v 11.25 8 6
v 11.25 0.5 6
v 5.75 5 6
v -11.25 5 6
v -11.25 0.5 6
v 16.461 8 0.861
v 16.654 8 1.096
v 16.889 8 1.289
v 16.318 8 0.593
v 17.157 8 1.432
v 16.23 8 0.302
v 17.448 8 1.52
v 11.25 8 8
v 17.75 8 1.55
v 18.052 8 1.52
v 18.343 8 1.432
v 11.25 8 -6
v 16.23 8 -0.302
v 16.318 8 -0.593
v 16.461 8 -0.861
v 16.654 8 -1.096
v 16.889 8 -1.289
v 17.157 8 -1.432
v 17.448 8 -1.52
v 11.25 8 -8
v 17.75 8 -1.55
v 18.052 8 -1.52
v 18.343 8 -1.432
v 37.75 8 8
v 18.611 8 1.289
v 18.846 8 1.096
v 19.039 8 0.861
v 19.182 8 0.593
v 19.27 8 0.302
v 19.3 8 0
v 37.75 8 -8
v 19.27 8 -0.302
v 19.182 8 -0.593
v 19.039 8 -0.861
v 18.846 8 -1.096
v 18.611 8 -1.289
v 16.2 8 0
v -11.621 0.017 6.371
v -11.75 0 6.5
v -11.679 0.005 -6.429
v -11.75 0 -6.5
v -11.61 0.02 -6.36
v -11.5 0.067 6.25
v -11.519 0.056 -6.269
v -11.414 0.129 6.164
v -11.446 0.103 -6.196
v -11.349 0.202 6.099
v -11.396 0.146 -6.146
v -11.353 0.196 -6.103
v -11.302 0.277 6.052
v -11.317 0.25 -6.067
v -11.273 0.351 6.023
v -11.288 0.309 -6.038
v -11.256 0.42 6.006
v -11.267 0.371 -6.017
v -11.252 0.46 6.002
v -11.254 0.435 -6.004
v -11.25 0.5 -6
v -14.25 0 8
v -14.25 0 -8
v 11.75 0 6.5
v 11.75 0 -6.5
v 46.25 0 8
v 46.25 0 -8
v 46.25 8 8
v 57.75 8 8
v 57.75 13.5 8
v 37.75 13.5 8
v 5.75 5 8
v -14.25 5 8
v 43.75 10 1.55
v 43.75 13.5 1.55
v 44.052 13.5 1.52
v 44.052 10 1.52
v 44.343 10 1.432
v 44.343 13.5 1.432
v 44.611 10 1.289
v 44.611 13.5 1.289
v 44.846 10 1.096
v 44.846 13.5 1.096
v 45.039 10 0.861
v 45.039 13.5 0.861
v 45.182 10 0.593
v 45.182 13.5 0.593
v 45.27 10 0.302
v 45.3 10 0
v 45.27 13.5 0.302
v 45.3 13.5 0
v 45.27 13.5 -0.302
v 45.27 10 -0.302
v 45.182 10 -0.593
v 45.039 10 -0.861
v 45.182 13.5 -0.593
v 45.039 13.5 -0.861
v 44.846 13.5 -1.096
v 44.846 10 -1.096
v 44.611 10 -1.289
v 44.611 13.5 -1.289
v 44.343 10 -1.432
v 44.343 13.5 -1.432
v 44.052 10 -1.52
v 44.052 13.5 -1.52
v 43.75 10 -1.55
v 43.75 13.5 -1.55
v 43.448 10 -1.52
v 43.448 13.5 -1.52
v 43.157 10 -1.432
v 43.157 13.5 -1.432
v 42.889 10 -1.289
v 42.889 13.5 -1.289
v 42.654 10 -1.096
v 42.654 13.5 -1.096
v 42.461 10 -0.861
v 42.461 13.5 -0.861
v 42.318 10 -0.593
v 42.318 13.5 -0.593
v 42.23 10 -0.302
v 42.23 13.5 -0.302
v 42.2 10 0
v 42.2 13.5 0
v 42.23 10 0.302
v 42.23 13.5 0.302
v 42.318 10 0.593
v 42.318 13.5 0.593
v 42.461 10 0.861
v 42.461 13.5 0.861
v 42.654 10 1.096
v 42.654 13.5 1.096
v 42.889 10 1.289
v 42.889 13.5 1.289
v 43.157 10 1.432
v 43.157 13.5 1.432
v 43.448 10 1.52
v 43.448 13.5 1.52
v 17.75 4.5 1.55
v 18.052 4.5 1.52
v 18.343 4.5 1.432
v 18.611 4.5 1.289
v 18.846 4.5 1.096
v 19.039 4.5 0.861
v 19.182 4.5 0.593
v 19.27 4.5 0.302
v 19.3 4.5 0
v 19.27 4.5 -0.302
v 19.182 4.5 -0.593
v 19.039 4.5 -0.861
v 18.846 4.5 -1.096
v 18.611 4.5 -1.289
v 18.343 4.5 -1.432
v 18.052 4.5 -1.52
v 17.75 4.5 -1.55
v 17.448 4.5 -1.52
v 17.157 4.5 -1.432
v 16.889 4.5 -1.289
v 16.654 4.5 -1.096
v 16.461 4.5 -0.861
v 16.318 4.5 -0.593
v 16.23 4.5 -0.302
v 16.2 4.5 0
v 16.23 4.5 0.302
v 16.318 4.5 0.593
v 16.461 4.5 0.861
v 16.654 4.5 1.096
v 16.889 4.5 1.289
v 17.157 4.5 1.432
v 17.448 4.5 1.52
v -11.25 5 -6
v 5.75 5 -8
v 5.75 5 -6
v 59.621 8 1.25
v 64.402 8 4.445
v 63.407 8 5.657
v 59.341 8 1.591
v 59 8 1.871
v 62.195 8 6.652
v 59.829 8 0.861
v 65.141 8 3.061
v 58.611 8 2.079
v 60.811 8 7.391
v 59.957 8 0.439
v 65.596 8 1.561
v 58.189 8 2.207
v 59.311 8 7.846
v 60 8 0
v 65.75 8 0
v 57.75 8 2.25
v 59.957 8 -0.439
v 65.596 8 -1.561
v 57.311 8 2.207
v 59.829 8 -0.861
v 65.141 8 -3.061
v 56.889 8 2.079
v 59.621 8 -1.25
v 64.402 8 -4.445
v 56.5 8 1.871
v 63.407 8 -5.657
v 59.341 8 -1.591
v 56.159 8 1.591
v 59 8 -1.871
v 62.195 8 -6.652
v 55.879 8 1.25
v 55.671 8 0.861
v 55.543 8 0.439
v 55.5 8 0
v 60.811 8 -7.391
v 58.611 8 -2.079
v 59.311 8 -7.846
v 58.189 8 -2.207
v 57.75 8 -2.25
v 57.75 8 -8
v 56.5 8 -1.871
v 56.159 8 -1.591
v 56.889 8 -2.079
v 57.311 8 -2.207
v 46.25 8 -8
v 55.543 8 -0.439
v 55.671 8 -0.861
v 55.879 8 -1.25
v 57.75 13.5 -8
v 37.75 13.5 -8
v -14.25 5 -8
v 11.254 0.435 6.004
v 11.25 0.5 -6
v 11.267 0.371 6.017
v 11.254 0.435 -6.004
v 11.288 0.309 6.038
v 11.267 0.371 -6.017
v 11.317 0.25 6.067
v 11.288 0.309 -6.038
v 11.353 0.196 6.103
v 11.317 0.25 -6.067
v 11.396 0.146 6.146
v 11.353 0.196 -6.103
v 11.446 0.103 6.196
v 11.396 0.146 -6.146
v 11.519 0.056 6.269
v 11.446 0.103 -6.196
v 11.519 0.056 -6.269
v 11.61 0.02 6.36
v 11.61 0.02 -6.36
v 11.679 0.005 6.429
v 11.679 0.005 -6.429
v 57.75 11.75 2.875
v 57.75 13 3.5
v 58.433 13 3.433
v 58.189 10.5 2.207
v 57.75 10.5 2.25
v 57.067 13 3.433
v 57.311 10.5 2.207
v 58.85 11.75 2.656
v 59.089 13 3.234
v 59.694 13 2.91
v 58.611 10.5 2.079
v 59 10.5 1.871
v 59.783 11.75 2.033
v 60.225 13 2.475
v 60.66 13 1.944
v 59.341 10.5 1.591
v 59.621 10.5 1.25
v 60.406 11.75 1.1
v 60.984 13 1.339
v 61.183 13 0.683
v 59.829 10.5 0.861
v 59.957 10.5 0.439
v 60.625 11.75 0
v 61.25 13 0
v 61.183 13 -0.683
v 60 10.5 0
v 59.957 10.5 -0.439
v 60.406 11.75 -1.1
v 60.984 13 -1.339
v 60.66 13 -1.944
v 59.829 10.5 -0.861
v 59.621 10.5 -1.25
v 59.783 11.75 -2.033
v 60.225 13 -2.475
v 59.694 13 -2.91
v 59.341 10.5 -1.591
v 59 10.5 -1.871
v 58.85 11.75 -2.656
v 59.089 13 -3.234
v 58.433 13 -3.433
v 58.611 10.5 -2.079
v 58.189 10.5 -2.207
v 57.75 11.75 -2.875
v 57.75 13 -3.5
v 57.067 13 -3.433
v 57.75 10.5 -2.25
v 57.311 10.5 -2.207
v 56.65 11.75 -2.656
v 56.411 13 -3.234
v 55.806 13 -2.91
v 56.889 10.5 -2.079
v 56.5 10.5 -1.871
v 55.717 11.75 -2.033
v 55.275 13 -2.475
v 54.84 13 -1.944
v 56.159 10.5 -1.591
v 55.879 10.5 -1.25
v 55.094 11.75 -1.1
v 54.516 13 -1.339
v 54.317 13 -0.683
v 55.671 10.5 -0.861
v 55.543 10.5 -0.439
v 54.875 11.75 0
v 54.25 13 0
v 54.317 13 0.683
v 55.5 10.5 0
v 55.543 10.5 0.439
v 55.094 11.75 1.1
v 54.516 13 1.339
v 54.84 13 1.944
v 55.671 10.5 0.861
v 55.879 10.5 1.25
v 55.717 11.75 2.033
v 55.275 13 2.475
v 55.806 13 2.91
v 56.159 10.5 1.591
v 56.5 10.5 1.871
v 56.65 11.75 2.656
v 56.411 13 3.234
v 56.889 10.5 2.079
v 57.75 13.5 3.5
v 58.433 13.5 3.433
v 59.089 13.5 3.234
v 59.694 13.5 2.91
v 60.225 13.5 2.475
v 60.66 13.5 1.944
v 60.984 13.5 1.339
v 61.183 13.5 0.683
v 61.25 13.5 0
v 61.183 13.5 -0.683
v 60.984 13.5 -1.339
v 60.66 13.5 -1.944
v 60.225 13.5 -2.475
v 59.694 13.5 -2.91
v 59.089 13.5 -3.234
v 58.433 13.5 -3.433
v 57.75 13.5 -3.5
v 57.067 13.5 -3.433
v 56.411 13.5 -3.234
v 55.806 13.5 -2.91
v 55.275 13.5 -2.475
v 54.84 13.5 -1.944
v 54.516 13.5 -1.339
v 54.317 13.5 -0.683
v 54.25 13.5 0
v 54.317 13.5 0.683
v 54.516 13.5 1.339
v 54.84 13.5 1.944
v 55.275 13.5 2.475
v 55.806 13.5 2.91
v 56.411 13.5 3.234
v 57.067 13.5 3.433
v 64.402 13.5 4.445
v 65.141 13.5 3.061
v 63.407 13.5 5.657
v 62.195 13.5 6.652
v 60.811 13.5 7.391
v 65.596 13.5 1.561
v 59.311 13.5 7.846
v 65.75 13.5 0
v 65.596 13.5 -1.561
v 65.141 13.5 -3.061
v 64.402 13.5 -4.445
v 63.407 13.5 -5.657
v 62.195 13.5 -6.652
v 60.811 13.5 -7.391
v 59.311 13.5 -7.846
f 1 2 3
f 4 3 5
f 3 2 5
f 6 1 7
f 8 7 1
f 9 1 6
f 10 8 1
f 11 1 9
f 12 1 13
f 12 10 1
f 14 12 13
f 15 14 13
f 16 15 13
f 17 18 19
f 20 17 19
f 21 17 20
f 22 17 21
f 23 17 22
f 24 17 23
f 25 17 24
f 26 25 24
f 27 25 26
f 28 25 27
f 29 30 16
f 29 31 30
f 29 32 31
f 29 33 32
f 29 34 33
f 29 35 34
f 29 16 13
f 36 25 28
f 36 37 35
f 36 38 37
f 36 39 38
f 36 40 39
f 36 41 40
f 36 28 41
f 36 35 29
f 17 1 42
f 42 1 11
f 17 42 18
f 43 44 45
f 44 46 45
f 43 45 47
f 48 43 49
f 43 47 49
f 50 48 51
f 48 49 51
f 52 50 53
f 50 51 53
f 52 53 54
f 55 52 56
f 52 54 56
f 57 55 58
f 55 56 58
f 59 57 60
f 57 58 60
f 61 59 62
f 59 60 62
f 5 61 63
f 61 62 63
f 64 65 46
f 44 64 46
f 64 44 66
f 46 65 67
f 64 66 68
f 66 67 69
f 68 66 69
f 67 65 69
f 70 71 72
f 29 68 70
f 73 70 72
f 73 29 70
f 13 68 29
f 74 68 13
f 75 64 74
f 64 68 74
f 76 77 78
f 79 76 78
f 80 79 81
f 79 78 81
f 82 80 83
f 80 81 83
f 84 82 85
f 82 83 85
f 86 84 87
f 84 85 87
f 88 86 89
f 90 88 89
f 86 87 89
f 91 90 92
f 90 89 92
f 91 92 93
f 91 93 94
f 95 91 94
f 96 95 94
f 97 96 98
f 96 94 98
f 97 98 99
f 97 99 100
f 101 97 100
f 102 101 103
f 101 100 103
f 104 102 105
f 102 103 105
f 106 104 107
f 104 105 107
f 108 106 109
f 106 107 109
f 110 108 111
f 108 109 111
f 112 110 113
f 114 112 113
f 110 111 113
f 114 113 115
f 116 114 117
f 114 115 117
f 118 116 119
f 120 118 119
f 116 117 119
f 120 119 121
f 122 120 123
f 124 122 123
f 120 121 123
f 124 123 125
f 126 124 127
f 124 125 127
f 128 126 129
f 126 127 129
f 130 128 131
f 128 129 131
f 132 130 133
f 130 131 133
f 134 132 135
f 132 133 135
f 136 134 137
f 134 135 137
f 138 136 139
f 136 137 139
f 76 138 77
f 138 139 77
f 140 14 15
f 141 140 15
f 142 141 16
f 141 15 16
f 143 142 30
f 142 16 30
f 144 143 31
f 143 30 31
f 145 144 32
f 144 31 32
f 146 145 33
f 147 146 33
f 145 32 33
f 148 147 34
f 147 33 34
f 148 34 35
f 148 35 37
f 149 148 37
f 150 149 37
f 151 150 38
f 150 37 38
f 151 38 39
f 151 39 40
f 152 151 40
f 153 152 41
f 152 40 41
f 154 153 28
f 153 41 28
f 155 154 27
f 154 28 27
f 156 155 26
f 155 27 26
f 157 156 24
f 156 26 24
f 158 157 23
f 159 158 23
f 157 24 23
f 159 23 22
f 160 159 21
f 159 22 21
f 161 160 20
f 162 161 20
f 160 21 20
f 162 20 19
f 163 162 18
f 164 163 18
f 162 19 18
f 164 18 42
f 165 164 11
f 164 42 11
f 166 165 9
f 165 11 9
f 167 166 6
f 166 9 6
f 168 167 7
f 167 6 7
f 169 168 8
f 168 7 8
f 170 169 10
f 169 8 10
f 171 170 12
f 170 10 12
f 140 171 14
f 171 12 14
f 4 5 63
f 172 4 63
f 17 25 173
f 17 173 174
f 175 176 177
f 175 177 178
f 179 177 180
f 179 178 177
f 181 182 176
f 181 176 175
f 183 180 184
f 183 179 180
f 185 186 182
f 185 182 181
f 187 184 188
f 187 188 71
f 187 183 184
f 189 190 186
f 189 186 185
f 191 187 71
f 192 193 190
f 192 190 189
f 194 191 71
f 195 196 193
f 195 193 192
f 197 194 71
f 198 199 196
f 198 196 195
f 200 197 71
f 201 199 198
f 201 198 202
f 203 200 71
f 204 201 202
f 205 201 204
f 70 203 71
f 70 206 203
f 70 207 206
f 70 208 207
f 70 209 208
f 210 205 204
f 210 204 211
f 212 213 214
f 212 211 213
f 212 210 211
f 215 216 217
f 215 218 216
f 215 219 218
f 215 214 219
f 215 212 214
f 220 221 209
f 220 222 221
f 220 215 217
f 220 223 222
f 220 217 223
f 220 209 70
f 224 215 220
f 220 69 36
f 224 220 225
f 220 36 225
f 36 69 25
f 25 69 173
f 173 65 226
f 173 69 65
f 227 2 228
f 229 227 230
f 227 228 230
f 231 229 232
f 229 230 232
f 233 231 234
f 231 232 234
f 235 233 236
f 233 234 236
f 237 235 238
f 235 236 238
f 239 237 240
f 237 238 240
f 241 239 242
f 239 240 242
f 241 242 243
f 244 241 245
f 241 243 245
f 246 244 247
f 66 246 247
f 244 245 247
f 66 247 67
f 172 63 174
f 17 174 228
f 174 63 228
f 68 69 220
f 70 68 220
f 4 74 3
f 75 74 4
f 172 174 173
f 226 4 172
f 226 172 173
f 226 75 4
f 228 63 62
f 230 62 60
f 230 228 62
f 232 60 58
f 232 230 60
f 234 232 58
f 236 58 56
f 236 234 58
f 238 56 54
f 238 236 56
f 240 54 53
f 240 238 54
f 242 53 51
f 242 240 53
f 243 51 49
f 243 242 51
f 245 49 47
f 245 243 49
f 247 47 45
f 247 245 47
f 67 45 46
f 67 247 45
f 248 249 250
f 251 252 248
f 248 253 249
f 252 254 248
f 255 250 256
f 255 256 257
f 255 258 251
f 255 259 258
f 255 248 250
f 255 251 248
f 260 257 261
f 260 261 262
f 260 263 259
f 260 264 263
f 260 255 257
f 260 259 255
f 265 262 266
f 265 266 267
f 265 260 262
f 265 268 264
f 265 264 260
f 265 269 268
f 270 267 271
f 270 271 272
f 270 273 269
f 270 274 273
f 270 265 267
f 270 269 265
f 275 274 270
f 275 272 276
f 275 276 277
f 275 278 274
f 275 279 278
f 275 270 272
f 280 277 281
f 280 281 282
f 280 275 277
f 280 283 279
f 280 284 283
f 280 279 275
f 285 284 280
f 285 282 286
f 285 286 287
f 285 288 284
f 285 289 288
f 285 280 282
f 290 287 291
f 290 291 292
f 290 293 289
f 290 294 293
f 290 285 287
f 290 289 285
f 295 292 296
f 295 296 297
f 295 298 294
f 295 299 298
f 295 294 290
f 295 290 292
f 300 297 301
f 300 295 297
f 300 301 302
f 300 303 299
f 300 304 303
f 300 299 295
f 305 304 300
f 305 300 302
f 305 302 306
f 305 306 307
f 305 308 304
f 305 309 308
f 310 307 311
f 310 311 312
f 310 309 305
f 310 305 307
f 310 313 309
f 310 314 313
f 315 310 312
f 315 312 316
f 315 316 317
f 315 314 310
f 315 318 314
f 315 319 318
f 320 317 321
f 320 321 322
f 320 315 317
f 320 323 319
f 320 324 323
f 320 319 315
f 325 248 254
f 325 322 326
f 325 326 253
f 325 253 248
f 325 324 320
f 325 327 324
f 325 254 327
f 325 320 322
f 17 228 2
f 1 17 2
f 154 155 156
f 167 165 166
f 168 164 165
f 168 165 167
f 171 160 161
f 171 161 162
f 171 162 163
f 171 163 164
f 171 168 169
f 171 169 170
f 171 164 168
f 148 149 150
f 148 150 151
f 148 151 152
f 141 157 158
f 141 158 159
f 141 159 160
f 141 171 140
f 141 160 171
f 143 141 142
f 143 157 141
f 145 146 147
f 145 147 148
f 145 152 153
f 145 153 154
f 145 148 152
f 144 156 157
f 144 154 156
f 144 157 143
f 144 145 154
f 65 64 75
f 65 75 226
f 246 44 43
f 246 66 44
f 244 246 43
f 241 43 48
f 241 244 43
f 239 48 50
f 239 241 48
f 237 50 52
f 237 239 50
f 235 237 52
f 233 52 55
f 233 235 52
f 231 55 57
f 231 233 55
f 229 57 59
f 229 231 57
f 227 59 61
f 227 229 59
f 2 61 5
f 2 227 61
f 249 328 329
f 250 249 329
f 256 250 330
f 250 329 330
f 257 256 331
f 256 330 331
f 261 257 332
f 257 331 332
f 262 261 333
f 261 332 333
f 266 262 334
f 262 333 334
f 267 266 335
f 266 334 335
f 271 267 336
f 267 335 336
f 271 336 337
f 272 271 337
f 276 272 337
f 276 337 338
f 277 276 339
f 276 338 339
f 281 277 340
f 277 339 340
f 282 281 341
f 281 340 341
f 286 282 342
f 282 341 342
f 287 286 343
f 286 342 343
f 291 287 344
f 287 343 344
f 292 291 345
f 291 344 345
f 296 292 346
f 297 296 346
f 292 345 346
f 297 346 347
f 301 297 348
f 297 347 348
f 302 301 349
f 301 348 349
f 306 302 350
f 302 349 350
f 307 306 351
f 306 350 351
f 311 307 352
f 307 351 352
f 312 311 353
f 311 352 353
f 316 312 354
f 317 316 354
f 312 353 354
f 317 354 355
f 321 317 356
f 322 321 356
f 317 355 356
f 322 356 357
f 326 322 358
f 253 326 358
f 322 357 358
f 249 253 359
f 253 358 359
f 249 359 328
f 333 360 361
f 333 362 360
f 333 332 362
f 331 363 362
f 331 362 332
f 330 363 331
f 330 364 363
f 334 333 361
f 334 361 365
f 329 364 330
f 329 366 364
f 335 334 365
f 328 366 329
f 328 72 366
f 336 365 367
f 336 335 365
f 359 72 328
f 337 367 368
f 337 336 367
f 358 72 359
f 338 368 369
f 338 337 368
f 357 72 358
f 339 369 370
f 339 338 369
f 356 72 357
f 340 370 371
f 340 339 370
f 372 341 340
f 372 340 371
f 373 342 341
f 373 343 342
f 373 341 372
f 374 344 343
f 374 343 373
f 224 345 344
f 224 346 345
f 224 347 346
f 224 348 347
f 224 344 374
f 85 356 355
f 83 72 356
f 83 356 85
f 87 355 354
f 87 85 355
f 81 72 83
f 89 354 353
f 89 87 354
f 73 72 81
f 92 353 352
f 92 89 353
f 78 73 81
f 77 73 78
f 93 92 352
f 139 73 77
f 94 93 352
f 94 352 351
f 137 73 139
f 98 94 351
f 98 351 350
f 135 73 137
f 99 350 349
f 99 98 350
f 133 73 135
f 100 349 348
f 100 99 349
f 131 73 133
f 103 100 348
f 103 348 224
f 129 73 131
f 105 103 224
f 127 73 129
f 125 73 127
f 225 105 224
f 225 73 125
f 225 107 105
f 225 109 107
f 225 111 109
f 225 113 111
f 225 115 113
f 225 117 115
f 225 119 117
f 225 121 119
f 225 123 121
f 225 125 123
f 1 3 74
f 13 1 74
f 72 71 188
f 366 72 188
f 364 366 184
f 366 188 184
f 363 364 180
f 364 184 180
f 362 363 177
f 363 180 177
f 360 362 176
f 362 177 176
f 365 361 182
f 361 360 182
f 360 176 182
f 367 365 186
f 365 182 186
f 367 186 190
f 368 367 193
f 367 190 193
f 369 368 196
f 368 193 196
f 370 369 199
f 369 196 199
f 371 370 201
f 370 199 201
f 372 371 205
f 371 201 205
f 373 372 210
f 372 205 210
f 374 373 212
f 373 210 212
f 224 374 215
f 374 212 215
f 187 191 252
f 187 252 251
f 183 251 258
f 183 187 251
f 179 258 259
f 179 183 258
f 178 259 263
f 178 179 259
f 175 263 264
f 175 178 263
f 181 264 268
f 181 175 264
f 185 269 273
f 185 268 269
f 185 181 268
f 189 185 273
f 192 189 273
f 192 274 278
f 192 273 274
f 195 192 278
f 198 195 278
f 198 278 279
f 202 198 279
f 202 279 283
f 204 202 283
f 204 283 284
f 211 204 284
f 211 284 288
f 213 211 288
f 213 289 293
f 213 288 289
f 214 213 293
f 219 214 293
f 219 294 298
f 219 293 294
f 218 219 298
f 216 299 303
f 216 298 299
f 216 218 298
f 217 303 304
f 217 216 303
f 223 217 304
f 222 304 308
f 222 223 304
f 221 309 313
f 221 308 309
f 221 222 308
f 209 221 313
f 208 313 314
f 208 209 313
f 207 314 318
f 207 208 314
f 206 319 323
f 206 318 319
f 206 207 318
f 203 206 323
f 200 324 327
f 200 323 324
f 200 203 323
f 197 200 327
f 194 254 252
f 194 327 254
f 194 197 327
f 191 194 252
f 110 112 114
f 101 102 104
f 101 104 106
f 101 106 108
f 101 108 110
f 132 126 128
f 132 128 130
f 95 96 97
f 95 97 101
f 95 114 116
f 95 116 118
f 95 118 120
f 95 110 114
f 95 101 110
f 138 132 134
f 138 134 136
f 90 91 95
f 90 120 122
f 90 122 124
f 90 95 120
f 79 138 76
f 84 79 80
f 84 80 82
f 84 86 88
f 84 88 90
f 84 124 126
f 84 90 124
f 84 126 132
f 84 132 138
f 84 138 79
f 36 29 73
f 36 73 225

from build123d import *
from OCP.BRepFilletAPI import BRepFilletAPI_MakeChamfer

# Parameters (mm, degrees)
SKETCH1_W               = 34.25
SKETCH1_H               = 16
SKETCH1_W_2             = 22.5
SKETCH1_H_2             = 12
BOSS_EXTRUDE2_DEPTH     = 5
SKETCH4_W               = 16
SKETCH4_H               = 5
BOSS_EXTRUDE3_DEPTH     = 2
BOSS_EXTRUDE4_DEPTH     = 3
SKETCH6_R               = 1.55
CUT_EXTRUDE1_DEPTH      = 3.5
FILLET1_R               = 0.5
SKETCH8_W               = 25.75
SKETCH8_H               = 16
BOSS_EXTRUDE5_DEPTH     = 8
SKETCH9_W               = 10
SKETCH9_H               = 16
BOSS_EXTRUDE6_DEPTH     = 5.5
SKETCH10_R              = 1.55
CUT_EXTRUDE2_DEPTH      = 3.5
SKETCH11_W              = 16
SKETCH11_H              = 5.5
BOSS_EXTRUDE7_DEPTH     = 20
CUT_EXTRUDE3_DEPTH      = 70.543601431
CUT_EXTRUDE3_DEPTH_BACK = 70.543601431
SKETCH12_R              = 2.25
SKETCH13_R              = 3.5
CUT_EXTRUDE4_DEPTH      = 3
SKETCH14_W              = 1.5
SKETCH14_H              = 8
CUT_EXTRUDE5_DEPTH      = 70.002264456
CHAMFER1_SIZE2          = 1.25
CHAMFER1_SIZE           = 2.5
CHAMFER2_SIZE           = 5.5
CHAMFER2_SIZE_2         = 3


with BuildPart() as part:
    # Sketch1 → Boss-Extrude2 (new body)
    with BuildSketch(Plane(origin=(0, 0, 0), x_dir=(1, 0, 0), z_dir=(0, 1, 0))):
        with Locations((2.875, 0)):
            Rectangle(SKETCH1_W, SKETCH1_H)
        Rectangle(SKETCH1_W_2, SKETCH1_H_2, mode=Mode.SUBTRACT)
    extrude(amount=BOSS_EXTRUDE2_DEPTH)

    # Sketch4 → Boss-Extrude3 (add)
    with BuildSketch(Plane(origin=(20, 0, 0), x_dir=(0, 0, -1), z_dir=(1, 0, 0))):
        with Locations((0, 2.5)):
            Rectangle(SKETCH4_W, SKETCH4_H)
    extrude(amount=BOSS_EXTRUDE3_DEPTH)

    # Sketch3 → Boss-Extrude4 (add)
    with BuildSketch(Plane(origin=(0, 5, 0), x_dir=(1, 0, 0), z_dir=(0, 1, 0))):
        Polygon((5.75, 6), (11.25, 6), (11.25, -6), (5.75, -6), (5.75, -8), (22, -8), (22, 8), (5.75, 8), align=None)
    extrude(amount=BOSS_EXTRUDE4_DEPTH)

    # Sketch6 → Cut-Extrude1 (cut)
    with BuildSketch(Plane(origin=(0, 8, 0), x_dir=(1, 0, 0), z_dir=(0, 1, 0))):
        with Locations(Location((17.75, 0, 0), (0, 0, 270))):
            Circle(SKETCH6_R)
    extrude(amount=-CUT_EXTRUDE1_DEPTH, mode=Mode.SUBTRACT)

    # Fillet1
    fillet1_edges = [part.edges().sort_by_distance(p)[0] for p in [
        (11.25, 0, 0),
        (0, 0, -6),
        (-11.25, 0, 0),
        (0, 0, 6),
    ]]
    fillet(fillet1_edges, radius=FILLET1_R)

    # Sketch8 → Boss-Extrude5 (add)
    with BuildSketch(Plane(origin=(0, 8, 0), x_dir=(1, 0, 0), z_dir=(0, 1, 0))):
        with Locations((34.875, 0)):
            Rectangle(SKETCH8_W, SKETCH8_H)
    extrude(amount=-BOSS_EXTRUDE5_DEPTH)

    # Sketch9 → Boss-Extrude6 (add)
    with BuildSketch(Plane(origin=(0, 8, 0), x_dir=(1, 0, 0), z_dir=(0, 1, 0))):
        with Locations((42.75, 0)):
            Rectangle(SKETCH9_W, SKETCH9_H)
    extrude(amount=BOSS_EXTRUDE6_DEPTH)

    # Sketch10 → Cut-Extrude2 (cut)
    with BuildSketch(Plane(origin=(0, 13.5, 0), x_dir=(1, 0, 0), z_dir=(0, 1, 0))):
        with Locations(Location((43.75, 0, 0), (0, 0, 270))):
            Circle(SKETCH10_R)
    extrude(amount=-CUT_EXTRUDE2_DEPTH, mode=Mode.SUBTRACT)

    # Sketch11 → Boss-Extrude7 (add)
    with BuildSketch(Plane(origin=(47.75, 0, 0), x_dir=(0, 0, -1), z_dir=(1, 0, 0))):
        with Locations((0, 10.75)):
            Rectangle(SKETCH11_W, SKETCH11_H)
    extrude(amount=BOSS_EXTRUDE7_DEPTH)

    # Sketch12 → Cut-Extrude3 (cut, two sides: drawn at the far end of the back side and taken through both)
    with BuildSketch(Plane(origin=(0, 13.5, 0), x_dir=(1, 0, 0), z_dir=(0, 1, 0)).offset(-CUT_EXTRUDE3_DEPTH_BACK)):
        with Locations(Location((57.75, 0, 0), (0, 0, 270))):
            Circle(SKETCH12_R)
        with BuildLine():
            Line((57.75, 8), (67.75, 8))
            Line((67.75, 8), (67.75, -8))
            Line((67.75, -8), (57.75, -8))
            ThreePointArc((57.75, -8), (65.75, 0), (57.75, 8))
        make_face()
    extrude(amount=CUT_EXTRUDE3_DEPTH + CUT_EXTRUDE3_DEPTH_BACK, mode=Mode.SUBTRACT)

    # Sketch13 → Cut-Extrude4 (cut)
    with BuildSketch(Plane(origin=(0, 13.5, 0), x_dir=(1, 0, 0), z_dir=(0, 1, 0))):
        with Locations(Location((57.75, 0, 0), (0, 0, 270))):
            Circle(SKETCH13_R)
    extrude(amount=-CUT_EXTRUDE4_DEPTH, mode=Mode.SUBTRACT)

    # Sketch14 → Cut-Extrude5 (cut, through all)
    with BuildSketch(Plane(origin=(0, 0, -8), x_dir=(-1, 0, 0), z_dir=(0, 0, -1))):
        with Locations((-47, 4)):
            Rectangle(SKETCH14_W, SKETCH14_H)
    extrude(amount=-CUT_EXTRUDE5_DEPTH, mode=Mode.SUBTRACT)

    # Chamfer1
    chamfer1_edges = [part.edges().sort_by_distance(p)[0] for p in [
        (57.75, 10.5, -3.5),
    ]]
    chamfer1_side = [part.faces().sort_by_distance(p)[0] for p in [
        (57.75, 10.525, -3.5),
    ]]
    chamfer(chamfer1_edges, length=CHAMFER1_SIZE - 0.0001, length2=CHAMFER1_SIZE2 - 0.0001, reference=chamfer1_side[0])  # a hair under: the kernel refuses the full size

    # Chamfer2
    chamfer2_edges_1 = [part.edges().sort_by_distance(p)[0] for p in [
        (5.75, 8, 7),
    ]]
    chamfer2_side_1 = [part.faces().sort_by_distance(p)[0] for p in [
        (5.81, 8, 7),
    ]]
    chamfer2_edges_2 = [part.edges().sort_by_distance(p)[0] for p in [
        (5.75, 8, -7),
    ]]
    chamfer2_side_2 = [part.faces().sort_by_distance(p)[0] for p in [
        (5.81, 8, -7),
    ]]
    chamfer2 = BRepFilletAPI_MakeChamfer(part.part.solid().wrapped)
    for e in chamfer2_edges_1:
        chamfer2.Add(CHAMFER2_SIZE - 0.0001, CHAMFER2_SIZE_2 - 0.0001, e.wrapped, chamfer2_side_1[0].wrapped)
    for e in chamfer2_edges_2:
        chamfer2.Add(CHAMFER2_SIZE - 0.0001, CHAMFER2_SIZE_2 - 0.0001, e.wrapped, chamfer2_side_2[0].wrapped)
    add(Compound.cast(chamfer2.Shape()), mode=Mode.REPLACE)  # a hair under: the kernel refuses the full size


solid = part.part
